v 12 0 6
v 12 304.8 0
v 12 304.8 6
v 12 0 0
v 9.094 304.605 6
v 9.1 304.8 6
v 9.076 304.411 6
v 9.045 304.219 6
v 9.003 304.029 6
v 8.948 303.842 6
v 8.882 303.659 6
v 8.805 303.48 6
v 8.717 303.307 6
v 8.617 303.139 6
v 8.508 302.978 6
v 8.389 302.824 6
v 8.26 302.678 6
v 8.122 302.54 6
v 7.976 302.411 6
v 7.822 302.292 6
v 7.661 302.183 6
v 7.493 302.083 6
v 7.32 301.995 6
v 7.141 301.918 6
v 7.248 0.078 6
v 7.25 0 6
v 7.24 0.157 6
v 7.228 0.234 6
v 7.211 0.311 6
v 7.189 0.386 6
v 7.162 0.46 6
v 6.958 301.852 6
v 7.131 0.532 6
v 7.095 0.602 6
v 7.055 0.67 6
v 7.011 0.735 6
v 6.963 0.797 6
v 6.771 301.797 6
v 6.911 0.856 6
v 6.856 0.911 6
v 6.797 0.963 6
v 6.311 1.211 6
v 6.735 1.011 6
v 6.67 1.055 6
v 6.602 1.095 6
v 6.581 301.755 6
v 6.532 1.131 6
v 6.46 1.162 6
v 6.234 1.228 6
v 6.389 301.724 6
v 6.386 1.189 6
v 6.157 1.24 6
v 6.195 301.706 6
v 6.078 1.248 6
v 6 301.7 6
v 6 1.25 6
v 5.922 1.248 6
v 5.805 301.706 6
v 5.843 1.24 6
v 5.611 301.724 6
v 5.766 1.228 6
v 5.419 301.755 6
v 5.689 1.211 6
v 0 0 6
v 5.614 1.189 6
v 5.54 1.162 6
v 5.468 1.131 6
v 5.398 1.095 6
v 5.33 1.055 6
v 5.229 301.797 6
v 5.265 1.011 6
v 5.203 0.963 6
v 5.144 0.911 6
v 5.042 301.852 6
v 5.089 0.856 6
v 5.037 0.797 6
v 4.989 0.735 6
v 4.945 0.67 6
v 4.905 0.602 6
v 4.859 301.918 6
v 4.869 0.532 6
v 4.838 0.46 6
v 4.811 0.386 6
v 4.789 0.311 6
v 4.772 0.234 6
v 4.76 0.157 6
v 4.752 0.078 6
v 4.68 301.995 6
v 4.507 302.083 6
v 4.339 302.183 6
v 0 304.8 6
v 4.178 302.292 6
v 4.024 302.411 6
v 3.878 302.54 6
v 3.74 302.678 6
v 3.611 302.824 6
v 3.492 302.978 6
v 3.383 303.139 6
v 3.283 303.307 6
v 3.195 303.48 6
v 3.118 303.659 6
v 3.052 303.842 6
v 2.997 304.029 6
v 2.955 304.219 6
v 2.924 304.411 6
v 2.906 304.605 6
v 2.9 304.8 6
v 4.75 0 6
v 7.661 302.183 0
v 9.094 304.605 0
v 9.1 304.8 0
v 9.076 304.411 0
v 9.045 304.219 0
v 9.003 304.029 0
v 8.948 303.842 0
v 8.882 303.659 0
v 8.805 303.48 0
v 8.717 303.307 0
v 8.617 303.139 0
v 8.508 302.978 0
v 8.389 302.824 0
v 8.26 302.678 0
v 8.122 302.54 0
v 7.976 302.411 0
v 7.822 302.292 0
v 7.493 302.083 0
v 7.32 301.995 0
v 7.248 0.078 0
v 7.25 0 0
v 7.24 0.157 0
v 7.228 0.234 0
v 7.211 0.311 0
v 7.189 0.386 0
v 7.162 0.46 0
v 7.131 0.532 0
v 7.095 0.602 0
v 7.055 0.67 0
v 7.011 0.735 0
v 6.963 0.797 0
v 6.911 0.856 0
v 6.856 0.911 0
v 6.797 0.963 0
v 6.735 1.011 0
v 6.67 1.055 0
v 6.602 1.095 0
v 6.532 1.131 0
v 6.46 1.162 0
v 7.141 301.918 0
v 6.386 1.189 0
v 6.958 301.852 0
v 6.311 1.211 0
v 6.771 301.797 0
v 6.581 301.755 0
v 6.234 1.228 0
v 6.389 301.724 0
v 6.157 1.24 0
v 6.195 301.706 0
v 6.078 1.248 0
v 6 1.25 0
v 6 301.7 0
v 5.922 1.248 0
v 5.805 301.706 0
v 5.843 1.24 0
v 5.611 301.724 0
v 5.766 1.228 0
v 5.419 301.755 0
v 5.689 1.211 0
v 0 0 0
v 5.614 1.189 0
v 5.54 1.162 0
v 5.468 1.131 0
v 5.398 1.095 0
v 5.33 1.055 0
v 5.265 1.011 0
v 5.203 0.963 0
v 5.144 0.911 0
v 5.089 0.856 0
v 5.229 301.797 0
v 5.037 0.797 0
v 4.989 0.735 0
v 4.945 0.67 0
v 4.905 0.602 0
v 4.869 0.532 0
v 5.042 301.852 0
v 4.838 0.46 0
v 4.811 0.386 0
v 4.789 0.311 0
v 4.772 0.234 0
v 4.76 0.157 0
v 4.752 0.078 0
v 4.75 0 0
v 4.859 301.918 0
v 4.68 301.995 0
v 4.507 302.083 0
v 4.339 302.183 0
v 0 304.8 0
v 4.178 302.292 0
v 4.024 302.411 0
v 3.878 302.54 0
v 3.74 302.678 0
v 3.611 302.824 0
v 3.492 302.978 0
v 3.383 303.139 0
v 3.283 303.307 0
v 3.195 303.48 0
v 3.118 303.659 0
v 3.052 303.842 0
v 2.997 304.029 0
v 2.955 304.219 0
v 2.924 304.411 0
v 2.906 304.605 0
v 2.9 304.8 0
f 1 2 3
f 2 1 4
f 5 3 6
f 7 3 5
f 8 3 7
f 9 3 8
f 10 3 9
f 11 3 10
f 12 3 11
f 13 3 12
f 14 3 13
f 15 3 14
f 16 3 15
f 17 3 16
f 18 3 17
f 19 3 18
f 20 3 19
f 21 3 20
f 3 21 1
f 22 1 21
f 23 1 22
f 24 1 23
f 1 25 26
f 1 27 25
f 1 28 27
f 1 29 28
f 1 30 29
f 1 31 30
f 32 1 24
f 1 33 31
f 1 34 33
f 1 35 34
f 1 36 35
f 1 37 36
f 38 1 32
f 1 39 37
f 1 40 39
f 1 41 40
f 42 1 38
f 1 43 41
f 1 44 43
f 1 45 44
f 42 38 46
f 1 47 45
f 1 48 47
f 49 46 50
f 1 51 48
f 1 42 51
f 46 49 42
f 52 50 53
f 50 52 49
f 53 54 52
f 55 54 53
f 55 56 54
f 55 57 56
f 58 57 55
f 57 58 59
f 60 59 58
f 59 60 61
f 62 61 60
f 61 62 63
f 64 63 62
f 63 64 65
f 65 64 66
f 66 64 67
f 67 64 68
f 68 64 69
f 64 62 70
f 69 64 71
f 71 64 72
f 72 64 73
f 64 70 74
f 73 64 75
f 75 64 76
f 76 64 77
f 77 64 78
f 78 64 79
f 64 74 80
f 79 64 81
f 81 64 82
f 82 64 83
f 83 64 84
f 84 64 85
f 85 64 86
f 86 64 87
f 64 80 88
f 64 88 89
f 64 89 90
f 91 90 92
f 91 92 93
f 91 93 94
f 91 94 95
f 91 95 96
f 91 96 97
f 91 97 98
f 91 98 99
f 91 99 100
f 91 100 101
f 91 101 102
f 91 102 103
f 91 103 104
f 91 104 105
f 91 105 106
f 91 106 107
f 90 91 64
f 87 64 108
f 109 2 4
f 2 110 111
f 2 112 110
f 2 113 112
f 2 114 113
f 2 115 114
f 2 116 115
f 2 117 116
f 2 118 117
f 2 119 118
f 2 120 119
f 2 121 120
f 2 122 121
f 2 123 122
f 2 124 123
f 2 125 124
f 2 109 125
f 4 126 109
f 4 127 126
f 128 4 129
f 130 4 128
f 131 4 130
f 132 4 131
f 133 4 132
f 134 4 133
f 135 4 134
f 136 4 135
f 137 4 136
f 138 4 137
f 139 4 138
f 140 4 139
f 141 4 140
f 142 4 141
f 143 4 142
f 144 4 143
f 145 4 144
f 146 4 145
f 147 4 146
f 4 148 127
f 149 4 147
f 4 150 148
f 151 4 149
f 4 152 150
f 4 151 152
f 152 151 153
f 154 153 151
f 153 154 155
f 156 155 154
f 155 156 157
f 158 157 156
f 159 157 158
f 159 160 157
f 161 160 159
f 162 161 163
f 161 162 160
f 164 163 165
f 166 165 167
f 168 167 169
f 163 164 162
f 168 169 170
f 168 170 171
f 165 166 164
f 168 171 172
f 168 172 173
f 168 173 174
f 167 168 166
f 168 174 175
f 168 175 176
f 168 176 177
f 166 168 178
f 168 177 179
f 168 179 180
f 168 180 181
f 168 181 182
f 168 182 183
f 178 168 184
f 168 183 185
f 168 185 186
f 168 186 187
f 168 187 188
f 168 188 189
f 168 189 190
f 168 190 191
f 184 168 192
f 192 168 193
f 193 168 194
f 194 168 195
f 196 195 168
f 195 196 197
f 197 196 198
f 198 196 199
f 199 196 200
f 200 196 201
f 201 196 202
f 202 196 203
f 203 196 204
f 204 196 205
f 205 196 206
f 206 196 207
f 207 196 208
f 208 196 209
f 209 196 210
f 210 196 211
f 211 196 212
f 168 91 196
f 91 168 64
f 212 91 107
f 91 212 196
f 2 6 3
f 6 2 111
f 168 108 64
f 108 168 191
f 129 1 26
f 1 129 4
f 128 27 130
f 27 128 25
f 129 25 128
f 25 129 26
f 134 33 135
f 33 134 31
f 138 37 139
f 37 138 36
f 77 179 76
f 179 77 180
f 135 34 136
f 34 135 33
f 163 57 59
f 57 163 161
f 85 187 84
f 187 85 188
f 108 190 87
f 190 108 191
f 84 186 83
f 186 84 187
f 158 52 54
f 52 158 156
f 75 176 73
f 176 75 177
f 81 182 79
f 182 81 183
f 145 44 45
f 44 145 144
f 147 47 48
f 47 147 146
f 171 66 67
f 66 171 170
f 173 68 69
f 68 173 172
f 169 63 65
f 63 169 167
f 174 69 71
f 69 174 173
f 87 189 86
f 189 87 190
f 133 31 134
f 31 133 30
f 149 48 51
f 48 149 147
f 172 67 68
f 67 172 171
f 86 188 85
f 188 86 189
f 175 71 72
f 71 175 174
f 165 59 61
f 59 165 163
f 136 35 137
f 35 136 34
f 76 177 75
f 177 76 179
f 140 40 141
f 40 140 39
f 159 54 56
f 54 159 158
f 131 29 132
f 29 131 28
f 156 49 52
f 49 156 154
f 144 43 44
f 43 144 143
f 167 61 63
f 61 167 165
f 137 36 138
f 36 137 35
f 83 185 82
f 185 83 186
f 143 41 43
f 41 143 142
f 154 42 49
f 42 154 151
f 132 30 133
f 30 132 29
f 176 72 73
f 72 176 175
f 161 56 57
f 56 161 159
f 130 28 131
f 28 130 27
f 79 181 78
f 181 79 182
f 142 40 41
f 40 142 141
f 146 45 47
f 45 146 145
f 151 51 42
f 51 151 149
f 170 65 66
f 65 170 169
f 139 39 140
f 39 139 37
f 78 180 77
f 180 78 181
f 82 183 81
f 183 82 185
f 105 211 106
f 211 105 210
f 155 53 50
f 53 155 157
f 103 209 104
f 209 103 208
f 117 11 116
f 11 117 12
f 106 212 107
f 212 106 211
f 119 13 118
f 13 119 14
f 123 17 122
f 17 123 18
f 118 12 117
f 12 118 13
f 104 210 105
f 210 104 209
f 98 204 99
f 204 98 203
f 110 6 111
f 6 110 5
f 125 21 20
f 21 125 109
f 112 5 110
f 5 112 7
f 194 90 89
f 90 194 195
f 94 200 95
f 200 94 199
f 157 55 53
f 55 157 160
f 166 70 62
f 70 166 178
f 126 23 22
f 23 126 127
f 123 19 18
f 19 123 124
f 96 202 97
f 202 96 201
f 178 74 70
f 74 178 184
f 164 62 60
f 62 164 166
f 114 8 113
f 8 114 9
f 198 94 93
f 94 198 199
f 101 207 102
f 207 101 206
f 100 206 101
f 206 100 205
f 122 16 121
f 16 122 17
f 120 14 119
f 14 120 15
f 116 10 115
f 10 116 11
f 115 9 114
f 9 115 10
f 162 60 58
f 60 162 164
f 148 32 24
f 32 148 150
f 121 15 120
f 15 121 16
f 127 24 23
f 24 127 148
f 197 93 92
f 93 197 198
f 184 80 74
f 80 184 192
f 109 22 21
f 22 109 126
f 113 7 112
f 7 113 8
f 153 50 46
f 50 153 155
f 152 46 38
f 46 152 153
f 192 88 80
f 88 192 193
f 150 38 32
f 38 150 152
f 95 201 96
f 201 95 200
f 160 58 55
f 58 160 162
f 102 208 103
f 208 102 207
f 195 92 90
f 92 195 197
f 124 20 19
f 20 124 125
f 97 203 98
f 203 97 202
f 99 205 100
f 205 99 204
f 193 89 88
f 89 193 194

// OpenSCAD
width = 12;
length = 304.8;
height = 6;

nail_r = 1.25;
pen_r = 3.1;

hole_height = height + 2;

difference() {
    cube([width, length, height]);
    
    translate([(width / 2), 0, 0]) {
        cylinder(h=hole_height, r=nail_r, $fn=100);
    }
    
    translate([(width / 2), length, 0]) {
        cylinder(h=hole_height, r=pen_r, $fn=100);
    }
}
